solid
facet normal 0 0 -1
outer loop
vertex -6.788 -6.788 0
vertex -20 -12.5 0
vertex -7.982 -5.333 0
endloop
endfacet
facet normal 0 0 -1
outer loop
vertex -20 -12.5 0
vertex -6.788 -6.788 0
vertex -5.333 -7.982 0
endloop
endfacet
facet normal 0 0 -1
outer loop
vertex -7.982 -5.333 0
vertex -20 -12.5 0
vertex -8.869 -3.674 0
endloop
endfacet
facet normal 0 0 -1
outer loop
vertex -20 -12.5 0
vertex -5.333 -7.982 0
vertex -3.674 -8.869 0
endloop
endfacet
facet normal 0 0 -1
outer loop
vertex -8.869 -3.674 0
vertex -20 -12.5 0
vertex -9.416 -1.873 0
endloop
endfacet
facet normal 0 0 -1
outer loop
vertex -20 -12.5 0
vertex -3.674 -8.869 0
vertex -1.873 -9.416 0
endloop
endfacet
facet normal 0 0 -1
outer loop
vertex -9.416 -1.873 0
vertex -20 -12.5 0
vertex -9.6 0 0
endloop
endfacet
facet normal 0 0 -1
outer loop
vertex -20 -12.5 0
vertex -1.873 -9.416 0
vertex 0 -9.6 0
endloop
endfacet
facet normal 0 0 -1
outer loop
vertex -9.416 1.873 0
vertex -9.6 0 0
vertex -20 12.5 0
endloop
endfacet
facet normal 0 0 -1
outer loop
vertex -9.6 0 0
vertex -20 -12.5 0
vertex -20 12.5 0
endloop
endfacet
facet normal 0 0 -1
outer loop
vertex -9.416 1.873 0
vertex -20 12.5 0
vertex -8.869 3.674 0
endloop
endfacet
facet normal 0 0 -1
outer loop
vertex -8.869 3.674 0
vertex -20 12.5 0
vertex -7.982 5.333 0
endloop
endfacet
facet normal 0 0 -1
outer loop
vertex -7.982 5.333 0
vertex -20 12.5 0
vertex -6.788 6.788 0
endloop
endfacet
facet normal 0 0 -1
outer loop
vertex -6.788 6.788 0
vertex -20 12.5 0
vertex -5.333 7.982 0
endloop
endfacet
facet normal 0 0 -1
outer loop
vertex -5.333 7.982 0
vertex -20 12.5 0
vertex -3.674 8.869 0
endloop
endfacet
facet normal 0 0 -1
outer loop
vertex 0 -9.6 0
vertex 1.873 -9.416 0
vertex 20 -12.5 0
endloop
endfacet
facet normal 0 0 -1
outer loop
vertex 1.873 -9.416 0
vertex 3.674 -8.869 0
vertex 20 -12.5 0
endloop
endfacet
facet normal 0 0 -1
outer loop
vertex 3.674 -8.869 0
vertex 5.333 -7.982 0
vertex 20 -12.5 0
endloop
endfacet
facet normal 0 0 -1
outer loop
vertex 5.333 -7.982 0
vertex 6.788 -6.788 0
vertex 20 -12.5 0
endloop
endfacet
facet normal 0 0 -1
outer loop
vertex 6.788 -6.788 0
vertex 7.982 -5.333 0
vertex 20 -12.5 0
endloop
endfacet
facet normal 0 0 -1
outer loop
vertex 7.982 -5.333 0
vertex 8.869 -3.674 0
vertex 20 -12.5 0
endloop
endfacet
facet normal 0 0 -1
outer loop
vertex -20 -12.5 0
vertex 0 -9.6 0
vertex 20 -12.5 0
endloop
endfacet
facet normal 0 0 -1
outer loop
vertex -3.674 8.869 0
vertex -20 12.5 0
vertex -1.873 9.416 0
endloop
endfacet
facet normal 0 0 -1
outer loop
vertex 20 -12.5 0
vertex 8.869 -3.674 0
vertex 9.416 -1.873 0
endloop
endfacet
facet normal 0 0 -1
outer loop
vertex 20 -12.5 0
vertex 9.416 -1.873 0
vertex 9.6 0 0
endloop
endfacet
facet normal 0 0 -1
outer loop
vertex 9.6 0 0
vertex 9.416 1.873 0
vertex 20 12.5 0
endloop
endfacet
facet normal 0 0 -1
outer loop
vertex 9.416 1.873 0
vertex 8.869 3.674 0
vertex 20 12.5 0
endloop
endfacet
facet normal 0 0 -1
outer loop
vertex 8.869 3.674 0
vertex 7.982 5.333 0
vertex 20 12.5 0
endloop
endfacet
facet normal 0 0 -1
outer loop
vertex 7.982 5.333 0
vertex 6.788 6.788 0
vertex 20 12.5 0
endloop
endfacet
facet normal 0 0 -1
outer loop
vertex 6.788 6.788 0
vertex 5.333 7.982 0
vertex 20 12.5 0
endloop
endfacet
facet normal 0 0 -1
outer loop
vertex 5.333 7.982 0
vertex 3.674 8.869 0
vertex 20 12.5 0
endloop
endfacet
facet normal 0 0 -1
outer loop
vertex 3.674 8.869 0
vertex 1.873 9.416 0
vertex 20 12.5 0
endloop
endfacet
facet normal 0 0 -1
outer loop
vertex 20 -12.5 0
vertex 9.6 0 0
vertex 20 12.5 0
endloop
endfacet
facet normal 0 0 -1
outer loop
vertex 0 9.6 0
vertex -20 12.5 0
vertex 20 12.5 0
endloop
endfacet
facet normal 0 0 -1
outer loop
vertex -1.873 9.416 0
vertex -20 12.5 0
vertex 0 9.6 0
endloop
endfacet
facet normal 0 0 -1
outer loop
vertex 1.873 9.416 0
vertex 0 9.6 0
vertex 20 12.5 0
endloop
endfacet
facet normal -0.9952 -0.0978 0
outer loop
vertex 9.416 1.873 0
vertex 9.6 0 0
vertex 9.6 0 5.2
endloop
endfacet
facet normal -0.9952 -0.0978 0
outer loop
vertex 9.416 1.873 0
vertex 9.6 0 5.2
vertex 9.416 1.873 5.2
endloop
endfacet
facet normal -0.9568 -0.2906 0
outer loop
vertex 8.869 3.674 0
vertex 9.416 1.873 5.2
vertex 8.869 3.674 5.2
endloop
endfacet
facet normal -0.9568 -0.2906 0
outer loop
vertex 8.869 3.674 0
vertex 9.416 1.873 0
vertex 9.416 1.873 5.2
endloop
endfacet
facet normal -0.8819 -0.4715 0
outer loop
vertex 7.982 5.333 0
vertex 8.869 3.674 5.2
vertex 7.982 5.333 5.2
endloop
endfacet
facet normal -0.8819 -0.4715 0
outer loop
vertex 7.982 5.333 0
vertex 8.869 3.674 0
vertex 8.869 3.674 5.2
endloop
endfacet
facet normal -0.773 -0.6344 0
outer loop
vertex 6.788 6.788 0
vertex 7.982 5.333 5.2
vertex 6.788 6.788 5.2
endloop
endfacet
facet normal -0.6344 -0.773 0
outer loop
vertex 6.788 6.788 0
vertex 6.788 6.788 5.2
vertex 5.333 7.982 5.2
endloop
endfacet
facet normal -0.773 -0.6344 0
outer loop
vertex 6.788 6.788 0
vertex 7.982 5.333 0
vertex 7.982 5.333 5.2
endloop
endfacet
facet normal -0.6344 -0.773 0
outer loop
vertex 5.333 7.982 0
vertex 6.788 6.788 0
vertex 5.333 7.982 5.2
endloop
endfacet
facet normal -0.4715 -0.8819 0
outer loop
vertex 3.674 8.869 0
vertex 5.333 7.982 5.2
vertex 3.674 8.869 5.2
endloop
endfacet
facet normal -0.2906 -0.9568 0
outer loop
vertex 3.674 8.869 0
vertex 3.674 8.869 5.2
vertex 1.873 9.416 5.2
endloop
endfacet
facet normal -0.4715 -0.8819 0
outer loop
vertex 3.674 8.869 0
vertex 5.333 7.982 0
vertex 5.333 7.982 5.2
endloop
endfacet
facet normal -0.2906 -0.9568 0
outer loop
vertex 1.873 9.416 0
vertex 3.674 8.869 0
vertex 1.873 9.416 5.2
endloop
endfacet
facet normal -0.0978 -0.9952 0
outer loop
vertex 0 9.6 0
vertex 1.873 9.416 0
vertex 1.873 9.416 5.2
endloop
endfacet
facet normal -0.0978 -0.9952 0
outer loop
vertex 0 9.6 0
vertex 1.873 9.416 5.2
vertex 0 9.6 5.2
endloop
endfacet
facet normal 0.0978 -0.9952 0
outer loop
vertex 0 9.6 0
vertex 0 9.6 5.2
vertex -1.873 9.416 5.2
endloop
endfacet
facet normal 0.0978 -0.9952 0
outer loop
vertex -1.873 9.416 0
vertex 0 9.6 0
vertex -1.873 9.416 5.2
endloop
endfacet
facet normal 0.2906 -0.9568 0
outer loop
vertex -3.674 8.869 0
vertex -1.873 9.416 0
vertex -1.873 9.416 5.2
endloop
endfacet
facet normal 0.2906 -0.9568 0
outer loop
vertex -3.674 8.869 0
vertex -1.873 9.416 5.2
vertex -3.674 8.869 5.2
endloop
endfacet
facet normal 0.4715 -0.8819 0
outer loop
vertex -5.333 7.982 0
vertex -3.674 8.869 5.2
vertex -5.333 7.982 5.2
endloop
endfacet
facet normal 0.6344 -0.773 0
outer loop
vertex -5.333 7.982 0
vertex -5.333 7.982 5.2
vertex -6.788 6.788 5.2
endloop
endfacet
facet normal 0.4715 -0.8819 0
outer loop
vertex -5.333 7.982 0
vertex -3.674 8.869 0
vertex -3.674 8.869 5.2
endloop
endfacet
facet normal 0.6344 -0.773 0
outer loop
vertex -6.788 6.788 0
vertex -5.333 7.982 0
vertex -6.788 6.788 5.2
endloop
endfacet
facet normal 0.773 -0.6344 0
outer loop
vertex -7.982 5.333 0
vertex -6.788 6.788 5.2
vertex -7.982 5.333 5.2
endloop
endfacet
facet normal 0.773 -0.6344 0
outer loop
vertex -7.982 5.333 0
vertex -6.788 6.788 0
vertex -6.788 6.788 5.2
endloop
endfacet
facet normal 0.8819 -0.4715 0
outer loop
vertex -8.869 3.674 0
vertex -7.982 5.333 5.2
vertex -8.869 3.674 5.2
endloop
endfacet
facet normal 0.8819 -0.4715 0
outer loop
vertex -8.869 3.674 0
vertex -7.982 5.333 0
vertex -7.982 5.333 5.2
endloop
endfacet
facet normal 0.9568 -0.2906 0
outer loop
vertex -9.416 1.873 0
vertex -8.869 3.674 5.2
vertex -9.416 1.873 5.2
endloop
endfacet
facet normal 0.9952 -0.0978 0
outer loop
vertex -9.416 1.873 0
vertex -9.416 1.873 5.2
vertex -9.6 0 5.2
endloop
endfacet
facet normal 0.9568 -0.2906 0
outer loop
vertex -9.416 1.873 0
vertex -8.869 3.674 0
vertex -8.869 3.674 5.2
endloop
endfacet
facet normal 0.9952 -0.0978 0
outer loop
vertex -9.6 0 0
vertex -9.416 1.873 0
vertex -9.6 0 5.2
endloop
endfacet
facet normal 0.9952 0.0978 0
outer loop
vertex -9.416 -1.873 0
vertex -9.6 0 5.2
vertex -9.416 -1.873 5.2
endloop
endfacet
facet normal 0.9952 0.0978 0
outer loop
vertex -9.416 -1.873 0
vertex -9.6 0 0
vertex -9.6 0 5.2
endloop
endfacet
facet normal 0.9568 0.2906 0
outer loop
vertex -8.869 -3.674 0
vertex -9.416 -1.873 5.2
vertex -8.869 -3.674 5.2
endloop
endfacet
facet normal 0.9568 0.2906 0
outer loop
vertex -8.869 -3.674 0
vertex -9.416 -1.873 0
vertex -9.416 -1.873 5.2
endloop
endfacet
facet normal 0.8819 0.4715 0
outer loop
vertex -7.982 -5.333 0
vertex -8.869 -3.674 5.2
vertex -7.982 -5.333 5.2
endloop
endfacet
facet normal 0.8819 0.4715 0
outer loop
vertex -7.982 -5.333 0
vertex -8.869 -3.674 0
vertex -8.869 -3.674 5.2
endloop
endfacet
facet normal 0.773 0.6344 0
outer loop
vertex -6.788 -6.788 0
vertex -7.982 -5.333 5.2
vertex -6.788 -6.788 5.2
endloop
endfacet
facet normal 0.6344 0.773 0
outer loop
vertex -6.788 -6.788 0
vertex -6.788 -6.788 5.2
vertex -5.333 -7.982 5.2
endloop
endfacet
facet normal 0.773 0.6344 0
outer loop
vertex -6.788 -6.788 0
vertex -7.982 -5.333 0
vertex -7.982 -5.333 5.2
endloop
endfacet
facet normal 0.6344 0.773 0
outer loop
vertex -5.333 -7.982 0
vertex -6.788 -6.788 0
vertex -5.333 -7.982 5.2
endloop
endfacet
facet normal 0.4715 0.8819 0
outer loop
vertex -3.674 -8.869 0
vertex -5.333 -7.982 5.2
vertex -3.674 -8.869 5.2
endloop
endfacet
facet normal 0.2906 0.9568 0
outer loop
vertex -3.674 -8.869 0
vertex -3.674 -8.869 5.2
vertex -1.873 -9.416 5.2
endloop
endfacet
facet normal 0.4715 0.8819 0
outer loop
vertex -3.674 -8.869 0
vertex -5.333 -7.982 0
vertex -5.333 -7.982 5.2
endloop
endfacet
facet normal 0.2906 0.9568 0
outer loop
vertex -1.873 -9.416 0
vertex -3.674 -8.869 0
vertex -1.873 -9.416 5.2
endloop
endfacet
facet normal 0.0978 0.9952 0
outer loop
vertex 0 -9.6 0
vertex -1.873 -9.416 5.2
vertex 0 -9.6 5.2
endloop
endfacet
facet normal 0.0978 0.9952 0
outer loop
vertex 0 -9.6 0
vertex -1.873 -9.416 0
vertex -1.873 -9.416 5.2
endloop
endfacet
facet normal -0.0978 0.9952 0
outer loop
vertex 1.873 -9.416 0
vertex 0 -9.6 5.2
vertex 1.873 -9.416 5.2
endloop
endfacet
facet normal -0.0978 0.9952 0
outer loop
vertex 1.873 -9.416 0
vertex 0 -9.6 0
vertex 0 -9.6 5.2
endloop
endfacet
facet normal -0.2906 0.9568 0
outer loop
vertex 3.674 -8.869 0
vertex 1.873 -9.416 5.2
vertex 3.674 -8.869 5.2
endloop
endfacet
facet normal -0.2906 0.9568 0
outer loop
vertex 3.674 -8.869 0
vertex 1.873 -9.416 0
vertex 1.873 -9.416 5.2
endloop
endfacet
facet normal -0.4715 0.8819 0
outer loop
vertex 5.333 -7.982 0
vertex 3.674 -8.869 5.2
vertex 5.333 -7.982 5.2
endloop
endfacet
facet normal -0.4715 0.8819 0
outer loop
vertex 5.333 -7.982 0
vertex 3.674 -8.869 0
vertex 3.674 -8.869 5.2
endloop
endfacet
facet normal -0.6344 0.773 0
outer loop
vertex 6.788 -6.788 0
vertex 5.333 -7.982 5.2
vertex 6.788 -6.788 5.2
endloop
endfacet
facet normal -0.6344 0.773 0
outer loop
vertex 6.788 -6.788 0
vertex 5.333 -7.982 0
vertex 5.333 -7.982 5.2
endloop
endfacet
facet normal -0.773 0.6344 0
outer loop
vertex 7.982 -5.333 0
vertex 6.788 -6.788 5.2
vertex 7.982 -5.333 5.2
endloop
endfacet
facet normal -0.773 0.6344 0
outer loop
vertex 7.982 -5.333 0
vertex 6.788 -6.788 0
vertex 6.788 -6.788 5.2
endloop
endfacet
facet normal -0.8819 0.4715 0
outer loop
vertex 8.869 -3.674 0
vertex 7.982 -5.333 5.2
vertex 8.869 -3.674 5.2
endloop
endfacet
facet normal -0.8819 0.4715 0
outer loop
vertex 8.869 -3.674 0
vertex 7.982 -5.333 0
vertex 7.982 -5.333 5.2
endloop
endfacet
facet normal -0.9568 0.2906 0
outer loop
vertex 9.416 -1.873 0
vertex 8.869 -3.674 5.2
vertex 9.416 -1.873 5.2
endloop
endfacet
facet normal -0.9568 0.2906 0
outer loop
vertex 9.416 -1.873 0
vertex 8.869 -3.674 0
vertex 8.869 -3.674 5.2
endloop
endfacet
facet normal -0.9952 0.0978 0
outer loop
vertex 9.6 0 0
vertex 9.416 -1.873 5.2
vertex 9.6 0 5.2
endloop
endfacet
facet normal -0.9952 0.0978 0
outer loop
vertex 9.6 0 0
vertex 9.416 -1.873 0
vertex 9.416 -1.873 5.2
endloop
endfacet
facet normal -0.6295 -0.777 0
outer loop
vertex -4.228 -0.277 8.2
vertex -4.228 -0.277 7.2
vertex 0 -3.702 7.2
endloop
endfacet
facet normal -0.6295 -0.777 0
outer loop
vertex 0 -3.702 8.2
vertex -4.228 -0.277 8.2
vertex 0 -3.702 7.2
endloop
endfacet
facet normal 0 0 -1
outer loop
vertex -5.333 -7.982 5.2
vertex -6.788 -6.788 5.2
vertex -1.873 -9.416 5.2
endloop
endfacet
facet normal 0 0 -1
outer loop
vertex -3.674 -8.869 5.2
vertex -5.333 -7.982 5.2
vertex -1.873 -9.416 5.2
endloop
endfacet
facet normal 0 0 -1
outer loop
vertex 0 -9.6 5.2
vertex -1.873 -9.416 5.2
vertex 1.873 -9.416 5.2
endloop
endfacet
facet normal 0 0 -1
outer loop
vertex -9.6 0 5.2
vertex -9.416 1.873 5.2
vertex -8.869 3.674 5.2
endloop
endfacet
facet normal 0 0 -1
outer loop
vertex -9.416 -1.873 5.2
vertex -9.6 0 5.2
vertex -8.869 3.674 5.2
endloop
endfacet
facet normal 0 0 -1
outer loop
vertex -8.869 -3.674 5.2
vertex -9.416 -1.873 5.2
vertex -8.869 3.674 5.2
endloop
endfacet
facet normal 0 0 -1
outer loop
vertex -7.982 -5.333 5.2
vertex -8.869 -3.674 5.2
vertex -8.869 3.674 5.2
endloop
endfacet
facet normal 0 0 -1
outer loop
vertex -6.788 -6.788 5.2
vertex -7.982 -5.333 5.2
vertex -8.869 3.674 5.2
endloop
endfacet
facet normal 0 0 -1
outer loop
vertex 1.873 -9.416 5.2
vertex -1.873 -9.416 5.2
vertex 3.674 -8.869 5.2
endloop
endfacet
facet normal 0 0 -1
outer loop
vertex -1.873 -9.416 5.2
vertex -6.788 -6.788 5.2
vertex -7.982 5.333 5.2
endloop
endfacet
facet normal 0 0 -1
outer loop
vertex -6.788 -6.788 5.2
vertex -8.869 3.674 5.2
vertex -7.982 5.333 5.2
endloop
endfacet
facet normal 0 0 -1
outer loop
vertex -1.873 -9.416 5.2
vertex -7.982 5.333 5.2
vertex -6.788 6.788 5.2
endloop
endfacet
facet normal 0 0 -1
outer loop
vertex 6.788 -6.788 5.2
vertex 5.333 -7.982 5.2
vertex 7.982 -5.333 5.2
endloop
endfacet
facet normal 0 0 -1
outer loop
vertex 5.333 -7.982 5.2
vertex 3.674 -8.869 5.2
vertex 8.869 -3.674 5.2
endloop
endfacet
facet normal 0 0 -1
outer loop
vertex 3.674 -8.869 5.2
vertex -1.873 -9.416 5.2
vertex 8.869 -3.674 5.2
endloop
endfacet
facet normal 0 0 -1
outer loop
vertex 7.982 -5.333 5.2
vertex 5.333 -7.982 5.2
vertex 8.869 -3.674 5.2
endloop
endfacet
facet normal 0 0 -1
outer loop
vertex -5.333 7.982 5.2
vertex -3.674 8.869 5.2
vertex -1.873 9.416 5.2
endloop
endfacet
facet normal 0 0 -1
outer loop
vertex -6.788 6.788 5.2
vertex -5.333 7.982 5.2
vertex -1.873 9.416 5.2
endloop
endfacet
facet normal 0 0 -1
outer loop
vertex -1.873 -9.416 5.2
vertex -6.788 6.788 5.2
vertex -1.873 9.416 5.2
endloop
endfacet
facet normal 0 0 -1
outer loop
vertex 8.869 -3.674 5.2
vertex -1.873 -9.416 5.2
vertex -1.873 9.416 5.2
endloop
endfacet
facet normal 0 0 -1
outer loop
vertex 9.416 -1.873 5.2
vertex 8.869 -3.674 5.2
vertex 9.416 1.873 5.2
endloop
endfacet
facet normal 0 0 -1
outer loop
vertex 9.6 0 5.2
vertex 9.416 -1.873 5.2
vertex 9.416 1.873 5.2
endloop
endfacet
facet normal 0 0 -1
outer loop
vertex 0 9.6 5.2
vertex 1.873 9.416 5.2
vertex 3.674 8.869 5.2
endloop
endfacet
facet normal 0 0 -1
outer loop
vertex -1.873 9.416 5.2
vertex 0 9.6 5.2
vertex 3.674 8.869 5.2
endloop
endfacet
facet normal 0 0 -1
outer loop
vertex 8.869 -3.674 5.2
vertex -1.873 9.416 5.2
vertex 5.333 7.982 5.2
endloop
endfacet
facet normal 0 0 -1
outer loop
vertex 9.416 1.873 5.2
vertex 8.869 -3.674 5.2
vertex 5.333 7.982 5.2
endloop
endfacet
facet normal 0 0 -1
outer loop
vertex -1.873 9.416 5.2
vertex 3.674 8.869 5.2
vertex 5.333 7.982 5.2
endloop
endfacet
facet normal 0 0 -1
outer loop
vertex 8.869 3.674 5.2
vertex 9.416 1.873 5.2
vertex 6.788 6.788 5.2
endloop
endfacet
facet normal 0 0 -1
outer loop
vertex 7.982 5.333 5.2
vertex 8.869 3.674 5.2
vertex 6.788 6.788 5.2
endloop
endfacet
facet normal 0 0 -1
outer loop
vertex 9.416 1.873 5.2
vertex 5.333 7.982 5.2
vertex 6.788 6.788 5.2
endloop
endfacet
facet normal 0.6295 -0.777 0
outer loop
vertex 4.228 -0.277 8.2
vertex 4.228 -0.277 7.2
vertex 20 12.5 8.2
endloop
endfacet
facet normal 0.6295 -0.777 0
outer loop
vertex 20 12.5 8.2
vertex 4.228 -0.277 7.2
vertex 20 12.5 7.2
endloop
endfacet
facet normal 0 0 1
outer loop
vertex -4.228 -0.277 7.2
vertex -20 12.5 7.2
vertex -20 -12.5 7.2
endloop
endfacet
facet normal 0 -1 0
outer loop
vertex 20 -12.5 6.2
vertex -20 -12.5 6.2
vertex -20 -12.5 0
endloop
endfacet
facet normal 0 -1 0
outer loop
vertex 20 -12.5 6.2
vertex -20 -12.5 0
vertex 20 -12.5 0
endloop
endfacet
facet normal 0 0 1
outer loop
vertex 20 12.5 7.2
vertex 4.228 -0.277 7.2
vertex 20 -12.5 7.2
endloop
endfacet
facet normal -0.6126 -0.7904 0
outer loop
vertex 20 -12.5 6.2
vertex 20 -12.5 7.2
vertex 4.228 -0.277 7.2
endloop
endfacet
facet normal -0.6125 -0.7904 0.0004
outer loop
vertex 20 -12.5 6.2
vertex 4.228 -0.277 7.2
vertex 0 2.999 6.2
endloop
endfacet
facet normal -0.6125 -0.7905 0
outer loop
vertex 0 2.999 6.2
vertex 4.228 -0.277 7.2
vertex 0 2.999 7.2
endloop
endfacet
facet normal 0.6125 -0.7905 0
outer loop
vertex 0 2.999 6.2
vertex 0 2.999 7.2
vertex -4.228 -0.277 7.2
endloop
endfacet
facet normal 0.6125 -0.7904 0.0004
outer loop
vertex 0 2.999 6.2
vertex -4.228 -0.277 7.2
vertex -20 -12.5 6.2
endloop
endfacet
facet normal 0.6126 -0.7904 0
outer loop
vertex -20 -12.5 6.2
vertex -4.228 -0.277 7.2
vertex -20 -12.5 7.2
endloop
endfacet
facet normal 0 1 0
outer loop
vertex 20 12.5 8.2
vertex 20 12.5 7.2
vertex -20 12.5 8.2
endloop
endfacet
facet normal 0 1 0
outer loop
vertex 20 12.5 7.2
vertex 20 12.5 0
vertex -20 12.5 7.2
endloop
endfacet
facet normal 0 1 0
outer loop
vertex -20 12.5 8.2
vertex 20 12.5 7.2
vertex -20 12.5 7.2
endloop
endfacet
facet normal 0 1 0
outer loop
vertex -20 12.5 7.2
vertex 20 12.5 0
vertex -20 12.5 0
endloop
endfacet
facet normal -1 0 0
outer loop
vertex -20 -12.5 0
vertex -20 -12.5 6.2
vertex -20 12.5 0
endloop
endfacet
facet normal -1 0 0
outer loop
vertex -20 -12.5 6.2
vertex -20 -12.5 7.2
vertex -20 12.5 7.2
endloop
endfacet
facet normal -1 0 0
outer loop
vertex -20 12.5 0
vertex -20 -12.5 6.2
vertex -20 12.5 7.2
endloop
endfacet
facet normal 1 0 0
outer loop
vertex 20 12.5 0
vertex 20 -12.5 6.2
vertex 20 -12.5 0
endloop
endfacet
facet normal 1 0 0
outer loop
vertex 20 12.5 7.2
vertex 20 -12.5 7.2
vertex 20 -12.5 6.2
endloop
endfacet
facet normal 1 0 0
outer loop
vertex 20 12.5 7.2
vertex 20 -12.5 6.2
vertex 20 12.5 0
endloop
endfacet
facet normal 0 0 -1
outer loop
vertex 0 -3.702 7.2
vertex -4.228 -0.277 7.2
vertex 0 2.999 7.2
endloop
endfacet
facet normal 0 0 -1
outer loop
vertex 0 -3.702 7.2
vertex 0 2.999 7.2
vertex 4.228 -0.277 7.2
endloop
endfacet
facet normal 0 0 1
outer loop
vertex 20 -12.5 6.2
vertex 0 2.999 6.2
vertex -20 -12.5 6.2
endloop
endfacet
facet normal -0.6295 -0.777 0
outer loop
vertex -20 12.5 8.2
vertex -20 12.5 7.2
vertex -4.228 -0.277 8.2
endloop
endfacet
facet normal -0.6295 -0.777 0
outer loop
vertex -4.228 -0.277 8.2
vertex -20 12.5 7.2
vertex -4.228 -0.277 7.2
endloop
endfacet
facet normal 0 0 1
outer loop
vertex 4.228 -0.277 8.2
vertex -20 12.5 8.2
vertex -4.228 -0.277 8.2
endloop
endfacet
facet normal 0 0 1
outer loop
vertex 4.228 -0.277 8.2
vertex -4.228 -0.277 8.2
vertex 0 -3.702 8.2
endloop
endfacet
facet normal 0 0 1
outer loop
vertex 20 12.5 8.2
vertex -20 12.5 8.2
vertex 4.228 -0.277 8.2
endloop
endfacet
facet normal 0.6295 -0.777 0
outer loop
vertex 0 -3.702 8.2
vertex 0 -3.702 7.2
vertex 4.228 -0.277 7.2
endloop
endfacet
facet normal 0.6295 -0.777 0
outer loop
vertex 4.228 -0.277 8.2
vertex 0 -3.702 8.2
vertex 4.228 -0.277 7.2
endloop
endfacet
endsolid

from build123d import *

# Parameters (mm, degrees)
F0_R     = 11.6
F0_R_2   = 9.6
F1_DEPTH = 5.2
F2_R     = 11.6
F2_R_2   = 9.6
F3_DEPTH = 2
F4_W     = 40
F4_H     = 25
F4_R     = 11.6
F5_DEPTH = 7.2
F7_DEPTH = 1
F9_DEPTH = 1


with BuildPart() as f1:
    # F0 (on Top) → F1 (new body)
    with BuildSketch(Plane.XY):
        Circle(F0_R)
        Circle(F0_R_2, mode=Mode.SUBTRACT)
    extrude(amount=F1_DEPTH)

    # F2 (on face) → F3 (join)
    with BuildSketch(Plane.XY.offset(5.2)):
        Circle(F2_R)
        Circle(F2_R_2, mode=Mode.SUBTRACT)
        Circle(F2_R_2)
    extrude(amount=F3_DEPTH)

    # F4 (on face) → F5 (join)
    with BuildSketch(Plane.XY.offset(7.2)):
        Rectangle(F4_W, F4_H)
        Circle(F4_R, mode=Mode.SUBTRACT)
    extrude(amount=-F5_DEPTH)

    # F6 (on face) → F7 (cut)
    with BuildSketch(Plane.XY.offset(7.2)):
        Polygon((0, 2.9988845345), (-20, -12.5), (20, -12.5), align=None)
    extrude(amount=-F7_DEPTH, mode=Mode.SUBTRACT)

    # F8 (on face) → F9 (join)
    with BuildSketch(Plane.XY.offset(7.2)):
        Polygon((20, 12.5), (-20, 12.5), (-4.2277933686, -0.2774195283), (0, 2.9988845345), (4.2277933686, -0.2774195283), align=None)
        Polygon((0, 2.9988845345), (-4.2277933686, -0.2774195283), (0, -3.702450078), (4.2277933686, -0.2774195283), align=None)
    extrude(amount=F9_DEPTH)


solid = f1.part
